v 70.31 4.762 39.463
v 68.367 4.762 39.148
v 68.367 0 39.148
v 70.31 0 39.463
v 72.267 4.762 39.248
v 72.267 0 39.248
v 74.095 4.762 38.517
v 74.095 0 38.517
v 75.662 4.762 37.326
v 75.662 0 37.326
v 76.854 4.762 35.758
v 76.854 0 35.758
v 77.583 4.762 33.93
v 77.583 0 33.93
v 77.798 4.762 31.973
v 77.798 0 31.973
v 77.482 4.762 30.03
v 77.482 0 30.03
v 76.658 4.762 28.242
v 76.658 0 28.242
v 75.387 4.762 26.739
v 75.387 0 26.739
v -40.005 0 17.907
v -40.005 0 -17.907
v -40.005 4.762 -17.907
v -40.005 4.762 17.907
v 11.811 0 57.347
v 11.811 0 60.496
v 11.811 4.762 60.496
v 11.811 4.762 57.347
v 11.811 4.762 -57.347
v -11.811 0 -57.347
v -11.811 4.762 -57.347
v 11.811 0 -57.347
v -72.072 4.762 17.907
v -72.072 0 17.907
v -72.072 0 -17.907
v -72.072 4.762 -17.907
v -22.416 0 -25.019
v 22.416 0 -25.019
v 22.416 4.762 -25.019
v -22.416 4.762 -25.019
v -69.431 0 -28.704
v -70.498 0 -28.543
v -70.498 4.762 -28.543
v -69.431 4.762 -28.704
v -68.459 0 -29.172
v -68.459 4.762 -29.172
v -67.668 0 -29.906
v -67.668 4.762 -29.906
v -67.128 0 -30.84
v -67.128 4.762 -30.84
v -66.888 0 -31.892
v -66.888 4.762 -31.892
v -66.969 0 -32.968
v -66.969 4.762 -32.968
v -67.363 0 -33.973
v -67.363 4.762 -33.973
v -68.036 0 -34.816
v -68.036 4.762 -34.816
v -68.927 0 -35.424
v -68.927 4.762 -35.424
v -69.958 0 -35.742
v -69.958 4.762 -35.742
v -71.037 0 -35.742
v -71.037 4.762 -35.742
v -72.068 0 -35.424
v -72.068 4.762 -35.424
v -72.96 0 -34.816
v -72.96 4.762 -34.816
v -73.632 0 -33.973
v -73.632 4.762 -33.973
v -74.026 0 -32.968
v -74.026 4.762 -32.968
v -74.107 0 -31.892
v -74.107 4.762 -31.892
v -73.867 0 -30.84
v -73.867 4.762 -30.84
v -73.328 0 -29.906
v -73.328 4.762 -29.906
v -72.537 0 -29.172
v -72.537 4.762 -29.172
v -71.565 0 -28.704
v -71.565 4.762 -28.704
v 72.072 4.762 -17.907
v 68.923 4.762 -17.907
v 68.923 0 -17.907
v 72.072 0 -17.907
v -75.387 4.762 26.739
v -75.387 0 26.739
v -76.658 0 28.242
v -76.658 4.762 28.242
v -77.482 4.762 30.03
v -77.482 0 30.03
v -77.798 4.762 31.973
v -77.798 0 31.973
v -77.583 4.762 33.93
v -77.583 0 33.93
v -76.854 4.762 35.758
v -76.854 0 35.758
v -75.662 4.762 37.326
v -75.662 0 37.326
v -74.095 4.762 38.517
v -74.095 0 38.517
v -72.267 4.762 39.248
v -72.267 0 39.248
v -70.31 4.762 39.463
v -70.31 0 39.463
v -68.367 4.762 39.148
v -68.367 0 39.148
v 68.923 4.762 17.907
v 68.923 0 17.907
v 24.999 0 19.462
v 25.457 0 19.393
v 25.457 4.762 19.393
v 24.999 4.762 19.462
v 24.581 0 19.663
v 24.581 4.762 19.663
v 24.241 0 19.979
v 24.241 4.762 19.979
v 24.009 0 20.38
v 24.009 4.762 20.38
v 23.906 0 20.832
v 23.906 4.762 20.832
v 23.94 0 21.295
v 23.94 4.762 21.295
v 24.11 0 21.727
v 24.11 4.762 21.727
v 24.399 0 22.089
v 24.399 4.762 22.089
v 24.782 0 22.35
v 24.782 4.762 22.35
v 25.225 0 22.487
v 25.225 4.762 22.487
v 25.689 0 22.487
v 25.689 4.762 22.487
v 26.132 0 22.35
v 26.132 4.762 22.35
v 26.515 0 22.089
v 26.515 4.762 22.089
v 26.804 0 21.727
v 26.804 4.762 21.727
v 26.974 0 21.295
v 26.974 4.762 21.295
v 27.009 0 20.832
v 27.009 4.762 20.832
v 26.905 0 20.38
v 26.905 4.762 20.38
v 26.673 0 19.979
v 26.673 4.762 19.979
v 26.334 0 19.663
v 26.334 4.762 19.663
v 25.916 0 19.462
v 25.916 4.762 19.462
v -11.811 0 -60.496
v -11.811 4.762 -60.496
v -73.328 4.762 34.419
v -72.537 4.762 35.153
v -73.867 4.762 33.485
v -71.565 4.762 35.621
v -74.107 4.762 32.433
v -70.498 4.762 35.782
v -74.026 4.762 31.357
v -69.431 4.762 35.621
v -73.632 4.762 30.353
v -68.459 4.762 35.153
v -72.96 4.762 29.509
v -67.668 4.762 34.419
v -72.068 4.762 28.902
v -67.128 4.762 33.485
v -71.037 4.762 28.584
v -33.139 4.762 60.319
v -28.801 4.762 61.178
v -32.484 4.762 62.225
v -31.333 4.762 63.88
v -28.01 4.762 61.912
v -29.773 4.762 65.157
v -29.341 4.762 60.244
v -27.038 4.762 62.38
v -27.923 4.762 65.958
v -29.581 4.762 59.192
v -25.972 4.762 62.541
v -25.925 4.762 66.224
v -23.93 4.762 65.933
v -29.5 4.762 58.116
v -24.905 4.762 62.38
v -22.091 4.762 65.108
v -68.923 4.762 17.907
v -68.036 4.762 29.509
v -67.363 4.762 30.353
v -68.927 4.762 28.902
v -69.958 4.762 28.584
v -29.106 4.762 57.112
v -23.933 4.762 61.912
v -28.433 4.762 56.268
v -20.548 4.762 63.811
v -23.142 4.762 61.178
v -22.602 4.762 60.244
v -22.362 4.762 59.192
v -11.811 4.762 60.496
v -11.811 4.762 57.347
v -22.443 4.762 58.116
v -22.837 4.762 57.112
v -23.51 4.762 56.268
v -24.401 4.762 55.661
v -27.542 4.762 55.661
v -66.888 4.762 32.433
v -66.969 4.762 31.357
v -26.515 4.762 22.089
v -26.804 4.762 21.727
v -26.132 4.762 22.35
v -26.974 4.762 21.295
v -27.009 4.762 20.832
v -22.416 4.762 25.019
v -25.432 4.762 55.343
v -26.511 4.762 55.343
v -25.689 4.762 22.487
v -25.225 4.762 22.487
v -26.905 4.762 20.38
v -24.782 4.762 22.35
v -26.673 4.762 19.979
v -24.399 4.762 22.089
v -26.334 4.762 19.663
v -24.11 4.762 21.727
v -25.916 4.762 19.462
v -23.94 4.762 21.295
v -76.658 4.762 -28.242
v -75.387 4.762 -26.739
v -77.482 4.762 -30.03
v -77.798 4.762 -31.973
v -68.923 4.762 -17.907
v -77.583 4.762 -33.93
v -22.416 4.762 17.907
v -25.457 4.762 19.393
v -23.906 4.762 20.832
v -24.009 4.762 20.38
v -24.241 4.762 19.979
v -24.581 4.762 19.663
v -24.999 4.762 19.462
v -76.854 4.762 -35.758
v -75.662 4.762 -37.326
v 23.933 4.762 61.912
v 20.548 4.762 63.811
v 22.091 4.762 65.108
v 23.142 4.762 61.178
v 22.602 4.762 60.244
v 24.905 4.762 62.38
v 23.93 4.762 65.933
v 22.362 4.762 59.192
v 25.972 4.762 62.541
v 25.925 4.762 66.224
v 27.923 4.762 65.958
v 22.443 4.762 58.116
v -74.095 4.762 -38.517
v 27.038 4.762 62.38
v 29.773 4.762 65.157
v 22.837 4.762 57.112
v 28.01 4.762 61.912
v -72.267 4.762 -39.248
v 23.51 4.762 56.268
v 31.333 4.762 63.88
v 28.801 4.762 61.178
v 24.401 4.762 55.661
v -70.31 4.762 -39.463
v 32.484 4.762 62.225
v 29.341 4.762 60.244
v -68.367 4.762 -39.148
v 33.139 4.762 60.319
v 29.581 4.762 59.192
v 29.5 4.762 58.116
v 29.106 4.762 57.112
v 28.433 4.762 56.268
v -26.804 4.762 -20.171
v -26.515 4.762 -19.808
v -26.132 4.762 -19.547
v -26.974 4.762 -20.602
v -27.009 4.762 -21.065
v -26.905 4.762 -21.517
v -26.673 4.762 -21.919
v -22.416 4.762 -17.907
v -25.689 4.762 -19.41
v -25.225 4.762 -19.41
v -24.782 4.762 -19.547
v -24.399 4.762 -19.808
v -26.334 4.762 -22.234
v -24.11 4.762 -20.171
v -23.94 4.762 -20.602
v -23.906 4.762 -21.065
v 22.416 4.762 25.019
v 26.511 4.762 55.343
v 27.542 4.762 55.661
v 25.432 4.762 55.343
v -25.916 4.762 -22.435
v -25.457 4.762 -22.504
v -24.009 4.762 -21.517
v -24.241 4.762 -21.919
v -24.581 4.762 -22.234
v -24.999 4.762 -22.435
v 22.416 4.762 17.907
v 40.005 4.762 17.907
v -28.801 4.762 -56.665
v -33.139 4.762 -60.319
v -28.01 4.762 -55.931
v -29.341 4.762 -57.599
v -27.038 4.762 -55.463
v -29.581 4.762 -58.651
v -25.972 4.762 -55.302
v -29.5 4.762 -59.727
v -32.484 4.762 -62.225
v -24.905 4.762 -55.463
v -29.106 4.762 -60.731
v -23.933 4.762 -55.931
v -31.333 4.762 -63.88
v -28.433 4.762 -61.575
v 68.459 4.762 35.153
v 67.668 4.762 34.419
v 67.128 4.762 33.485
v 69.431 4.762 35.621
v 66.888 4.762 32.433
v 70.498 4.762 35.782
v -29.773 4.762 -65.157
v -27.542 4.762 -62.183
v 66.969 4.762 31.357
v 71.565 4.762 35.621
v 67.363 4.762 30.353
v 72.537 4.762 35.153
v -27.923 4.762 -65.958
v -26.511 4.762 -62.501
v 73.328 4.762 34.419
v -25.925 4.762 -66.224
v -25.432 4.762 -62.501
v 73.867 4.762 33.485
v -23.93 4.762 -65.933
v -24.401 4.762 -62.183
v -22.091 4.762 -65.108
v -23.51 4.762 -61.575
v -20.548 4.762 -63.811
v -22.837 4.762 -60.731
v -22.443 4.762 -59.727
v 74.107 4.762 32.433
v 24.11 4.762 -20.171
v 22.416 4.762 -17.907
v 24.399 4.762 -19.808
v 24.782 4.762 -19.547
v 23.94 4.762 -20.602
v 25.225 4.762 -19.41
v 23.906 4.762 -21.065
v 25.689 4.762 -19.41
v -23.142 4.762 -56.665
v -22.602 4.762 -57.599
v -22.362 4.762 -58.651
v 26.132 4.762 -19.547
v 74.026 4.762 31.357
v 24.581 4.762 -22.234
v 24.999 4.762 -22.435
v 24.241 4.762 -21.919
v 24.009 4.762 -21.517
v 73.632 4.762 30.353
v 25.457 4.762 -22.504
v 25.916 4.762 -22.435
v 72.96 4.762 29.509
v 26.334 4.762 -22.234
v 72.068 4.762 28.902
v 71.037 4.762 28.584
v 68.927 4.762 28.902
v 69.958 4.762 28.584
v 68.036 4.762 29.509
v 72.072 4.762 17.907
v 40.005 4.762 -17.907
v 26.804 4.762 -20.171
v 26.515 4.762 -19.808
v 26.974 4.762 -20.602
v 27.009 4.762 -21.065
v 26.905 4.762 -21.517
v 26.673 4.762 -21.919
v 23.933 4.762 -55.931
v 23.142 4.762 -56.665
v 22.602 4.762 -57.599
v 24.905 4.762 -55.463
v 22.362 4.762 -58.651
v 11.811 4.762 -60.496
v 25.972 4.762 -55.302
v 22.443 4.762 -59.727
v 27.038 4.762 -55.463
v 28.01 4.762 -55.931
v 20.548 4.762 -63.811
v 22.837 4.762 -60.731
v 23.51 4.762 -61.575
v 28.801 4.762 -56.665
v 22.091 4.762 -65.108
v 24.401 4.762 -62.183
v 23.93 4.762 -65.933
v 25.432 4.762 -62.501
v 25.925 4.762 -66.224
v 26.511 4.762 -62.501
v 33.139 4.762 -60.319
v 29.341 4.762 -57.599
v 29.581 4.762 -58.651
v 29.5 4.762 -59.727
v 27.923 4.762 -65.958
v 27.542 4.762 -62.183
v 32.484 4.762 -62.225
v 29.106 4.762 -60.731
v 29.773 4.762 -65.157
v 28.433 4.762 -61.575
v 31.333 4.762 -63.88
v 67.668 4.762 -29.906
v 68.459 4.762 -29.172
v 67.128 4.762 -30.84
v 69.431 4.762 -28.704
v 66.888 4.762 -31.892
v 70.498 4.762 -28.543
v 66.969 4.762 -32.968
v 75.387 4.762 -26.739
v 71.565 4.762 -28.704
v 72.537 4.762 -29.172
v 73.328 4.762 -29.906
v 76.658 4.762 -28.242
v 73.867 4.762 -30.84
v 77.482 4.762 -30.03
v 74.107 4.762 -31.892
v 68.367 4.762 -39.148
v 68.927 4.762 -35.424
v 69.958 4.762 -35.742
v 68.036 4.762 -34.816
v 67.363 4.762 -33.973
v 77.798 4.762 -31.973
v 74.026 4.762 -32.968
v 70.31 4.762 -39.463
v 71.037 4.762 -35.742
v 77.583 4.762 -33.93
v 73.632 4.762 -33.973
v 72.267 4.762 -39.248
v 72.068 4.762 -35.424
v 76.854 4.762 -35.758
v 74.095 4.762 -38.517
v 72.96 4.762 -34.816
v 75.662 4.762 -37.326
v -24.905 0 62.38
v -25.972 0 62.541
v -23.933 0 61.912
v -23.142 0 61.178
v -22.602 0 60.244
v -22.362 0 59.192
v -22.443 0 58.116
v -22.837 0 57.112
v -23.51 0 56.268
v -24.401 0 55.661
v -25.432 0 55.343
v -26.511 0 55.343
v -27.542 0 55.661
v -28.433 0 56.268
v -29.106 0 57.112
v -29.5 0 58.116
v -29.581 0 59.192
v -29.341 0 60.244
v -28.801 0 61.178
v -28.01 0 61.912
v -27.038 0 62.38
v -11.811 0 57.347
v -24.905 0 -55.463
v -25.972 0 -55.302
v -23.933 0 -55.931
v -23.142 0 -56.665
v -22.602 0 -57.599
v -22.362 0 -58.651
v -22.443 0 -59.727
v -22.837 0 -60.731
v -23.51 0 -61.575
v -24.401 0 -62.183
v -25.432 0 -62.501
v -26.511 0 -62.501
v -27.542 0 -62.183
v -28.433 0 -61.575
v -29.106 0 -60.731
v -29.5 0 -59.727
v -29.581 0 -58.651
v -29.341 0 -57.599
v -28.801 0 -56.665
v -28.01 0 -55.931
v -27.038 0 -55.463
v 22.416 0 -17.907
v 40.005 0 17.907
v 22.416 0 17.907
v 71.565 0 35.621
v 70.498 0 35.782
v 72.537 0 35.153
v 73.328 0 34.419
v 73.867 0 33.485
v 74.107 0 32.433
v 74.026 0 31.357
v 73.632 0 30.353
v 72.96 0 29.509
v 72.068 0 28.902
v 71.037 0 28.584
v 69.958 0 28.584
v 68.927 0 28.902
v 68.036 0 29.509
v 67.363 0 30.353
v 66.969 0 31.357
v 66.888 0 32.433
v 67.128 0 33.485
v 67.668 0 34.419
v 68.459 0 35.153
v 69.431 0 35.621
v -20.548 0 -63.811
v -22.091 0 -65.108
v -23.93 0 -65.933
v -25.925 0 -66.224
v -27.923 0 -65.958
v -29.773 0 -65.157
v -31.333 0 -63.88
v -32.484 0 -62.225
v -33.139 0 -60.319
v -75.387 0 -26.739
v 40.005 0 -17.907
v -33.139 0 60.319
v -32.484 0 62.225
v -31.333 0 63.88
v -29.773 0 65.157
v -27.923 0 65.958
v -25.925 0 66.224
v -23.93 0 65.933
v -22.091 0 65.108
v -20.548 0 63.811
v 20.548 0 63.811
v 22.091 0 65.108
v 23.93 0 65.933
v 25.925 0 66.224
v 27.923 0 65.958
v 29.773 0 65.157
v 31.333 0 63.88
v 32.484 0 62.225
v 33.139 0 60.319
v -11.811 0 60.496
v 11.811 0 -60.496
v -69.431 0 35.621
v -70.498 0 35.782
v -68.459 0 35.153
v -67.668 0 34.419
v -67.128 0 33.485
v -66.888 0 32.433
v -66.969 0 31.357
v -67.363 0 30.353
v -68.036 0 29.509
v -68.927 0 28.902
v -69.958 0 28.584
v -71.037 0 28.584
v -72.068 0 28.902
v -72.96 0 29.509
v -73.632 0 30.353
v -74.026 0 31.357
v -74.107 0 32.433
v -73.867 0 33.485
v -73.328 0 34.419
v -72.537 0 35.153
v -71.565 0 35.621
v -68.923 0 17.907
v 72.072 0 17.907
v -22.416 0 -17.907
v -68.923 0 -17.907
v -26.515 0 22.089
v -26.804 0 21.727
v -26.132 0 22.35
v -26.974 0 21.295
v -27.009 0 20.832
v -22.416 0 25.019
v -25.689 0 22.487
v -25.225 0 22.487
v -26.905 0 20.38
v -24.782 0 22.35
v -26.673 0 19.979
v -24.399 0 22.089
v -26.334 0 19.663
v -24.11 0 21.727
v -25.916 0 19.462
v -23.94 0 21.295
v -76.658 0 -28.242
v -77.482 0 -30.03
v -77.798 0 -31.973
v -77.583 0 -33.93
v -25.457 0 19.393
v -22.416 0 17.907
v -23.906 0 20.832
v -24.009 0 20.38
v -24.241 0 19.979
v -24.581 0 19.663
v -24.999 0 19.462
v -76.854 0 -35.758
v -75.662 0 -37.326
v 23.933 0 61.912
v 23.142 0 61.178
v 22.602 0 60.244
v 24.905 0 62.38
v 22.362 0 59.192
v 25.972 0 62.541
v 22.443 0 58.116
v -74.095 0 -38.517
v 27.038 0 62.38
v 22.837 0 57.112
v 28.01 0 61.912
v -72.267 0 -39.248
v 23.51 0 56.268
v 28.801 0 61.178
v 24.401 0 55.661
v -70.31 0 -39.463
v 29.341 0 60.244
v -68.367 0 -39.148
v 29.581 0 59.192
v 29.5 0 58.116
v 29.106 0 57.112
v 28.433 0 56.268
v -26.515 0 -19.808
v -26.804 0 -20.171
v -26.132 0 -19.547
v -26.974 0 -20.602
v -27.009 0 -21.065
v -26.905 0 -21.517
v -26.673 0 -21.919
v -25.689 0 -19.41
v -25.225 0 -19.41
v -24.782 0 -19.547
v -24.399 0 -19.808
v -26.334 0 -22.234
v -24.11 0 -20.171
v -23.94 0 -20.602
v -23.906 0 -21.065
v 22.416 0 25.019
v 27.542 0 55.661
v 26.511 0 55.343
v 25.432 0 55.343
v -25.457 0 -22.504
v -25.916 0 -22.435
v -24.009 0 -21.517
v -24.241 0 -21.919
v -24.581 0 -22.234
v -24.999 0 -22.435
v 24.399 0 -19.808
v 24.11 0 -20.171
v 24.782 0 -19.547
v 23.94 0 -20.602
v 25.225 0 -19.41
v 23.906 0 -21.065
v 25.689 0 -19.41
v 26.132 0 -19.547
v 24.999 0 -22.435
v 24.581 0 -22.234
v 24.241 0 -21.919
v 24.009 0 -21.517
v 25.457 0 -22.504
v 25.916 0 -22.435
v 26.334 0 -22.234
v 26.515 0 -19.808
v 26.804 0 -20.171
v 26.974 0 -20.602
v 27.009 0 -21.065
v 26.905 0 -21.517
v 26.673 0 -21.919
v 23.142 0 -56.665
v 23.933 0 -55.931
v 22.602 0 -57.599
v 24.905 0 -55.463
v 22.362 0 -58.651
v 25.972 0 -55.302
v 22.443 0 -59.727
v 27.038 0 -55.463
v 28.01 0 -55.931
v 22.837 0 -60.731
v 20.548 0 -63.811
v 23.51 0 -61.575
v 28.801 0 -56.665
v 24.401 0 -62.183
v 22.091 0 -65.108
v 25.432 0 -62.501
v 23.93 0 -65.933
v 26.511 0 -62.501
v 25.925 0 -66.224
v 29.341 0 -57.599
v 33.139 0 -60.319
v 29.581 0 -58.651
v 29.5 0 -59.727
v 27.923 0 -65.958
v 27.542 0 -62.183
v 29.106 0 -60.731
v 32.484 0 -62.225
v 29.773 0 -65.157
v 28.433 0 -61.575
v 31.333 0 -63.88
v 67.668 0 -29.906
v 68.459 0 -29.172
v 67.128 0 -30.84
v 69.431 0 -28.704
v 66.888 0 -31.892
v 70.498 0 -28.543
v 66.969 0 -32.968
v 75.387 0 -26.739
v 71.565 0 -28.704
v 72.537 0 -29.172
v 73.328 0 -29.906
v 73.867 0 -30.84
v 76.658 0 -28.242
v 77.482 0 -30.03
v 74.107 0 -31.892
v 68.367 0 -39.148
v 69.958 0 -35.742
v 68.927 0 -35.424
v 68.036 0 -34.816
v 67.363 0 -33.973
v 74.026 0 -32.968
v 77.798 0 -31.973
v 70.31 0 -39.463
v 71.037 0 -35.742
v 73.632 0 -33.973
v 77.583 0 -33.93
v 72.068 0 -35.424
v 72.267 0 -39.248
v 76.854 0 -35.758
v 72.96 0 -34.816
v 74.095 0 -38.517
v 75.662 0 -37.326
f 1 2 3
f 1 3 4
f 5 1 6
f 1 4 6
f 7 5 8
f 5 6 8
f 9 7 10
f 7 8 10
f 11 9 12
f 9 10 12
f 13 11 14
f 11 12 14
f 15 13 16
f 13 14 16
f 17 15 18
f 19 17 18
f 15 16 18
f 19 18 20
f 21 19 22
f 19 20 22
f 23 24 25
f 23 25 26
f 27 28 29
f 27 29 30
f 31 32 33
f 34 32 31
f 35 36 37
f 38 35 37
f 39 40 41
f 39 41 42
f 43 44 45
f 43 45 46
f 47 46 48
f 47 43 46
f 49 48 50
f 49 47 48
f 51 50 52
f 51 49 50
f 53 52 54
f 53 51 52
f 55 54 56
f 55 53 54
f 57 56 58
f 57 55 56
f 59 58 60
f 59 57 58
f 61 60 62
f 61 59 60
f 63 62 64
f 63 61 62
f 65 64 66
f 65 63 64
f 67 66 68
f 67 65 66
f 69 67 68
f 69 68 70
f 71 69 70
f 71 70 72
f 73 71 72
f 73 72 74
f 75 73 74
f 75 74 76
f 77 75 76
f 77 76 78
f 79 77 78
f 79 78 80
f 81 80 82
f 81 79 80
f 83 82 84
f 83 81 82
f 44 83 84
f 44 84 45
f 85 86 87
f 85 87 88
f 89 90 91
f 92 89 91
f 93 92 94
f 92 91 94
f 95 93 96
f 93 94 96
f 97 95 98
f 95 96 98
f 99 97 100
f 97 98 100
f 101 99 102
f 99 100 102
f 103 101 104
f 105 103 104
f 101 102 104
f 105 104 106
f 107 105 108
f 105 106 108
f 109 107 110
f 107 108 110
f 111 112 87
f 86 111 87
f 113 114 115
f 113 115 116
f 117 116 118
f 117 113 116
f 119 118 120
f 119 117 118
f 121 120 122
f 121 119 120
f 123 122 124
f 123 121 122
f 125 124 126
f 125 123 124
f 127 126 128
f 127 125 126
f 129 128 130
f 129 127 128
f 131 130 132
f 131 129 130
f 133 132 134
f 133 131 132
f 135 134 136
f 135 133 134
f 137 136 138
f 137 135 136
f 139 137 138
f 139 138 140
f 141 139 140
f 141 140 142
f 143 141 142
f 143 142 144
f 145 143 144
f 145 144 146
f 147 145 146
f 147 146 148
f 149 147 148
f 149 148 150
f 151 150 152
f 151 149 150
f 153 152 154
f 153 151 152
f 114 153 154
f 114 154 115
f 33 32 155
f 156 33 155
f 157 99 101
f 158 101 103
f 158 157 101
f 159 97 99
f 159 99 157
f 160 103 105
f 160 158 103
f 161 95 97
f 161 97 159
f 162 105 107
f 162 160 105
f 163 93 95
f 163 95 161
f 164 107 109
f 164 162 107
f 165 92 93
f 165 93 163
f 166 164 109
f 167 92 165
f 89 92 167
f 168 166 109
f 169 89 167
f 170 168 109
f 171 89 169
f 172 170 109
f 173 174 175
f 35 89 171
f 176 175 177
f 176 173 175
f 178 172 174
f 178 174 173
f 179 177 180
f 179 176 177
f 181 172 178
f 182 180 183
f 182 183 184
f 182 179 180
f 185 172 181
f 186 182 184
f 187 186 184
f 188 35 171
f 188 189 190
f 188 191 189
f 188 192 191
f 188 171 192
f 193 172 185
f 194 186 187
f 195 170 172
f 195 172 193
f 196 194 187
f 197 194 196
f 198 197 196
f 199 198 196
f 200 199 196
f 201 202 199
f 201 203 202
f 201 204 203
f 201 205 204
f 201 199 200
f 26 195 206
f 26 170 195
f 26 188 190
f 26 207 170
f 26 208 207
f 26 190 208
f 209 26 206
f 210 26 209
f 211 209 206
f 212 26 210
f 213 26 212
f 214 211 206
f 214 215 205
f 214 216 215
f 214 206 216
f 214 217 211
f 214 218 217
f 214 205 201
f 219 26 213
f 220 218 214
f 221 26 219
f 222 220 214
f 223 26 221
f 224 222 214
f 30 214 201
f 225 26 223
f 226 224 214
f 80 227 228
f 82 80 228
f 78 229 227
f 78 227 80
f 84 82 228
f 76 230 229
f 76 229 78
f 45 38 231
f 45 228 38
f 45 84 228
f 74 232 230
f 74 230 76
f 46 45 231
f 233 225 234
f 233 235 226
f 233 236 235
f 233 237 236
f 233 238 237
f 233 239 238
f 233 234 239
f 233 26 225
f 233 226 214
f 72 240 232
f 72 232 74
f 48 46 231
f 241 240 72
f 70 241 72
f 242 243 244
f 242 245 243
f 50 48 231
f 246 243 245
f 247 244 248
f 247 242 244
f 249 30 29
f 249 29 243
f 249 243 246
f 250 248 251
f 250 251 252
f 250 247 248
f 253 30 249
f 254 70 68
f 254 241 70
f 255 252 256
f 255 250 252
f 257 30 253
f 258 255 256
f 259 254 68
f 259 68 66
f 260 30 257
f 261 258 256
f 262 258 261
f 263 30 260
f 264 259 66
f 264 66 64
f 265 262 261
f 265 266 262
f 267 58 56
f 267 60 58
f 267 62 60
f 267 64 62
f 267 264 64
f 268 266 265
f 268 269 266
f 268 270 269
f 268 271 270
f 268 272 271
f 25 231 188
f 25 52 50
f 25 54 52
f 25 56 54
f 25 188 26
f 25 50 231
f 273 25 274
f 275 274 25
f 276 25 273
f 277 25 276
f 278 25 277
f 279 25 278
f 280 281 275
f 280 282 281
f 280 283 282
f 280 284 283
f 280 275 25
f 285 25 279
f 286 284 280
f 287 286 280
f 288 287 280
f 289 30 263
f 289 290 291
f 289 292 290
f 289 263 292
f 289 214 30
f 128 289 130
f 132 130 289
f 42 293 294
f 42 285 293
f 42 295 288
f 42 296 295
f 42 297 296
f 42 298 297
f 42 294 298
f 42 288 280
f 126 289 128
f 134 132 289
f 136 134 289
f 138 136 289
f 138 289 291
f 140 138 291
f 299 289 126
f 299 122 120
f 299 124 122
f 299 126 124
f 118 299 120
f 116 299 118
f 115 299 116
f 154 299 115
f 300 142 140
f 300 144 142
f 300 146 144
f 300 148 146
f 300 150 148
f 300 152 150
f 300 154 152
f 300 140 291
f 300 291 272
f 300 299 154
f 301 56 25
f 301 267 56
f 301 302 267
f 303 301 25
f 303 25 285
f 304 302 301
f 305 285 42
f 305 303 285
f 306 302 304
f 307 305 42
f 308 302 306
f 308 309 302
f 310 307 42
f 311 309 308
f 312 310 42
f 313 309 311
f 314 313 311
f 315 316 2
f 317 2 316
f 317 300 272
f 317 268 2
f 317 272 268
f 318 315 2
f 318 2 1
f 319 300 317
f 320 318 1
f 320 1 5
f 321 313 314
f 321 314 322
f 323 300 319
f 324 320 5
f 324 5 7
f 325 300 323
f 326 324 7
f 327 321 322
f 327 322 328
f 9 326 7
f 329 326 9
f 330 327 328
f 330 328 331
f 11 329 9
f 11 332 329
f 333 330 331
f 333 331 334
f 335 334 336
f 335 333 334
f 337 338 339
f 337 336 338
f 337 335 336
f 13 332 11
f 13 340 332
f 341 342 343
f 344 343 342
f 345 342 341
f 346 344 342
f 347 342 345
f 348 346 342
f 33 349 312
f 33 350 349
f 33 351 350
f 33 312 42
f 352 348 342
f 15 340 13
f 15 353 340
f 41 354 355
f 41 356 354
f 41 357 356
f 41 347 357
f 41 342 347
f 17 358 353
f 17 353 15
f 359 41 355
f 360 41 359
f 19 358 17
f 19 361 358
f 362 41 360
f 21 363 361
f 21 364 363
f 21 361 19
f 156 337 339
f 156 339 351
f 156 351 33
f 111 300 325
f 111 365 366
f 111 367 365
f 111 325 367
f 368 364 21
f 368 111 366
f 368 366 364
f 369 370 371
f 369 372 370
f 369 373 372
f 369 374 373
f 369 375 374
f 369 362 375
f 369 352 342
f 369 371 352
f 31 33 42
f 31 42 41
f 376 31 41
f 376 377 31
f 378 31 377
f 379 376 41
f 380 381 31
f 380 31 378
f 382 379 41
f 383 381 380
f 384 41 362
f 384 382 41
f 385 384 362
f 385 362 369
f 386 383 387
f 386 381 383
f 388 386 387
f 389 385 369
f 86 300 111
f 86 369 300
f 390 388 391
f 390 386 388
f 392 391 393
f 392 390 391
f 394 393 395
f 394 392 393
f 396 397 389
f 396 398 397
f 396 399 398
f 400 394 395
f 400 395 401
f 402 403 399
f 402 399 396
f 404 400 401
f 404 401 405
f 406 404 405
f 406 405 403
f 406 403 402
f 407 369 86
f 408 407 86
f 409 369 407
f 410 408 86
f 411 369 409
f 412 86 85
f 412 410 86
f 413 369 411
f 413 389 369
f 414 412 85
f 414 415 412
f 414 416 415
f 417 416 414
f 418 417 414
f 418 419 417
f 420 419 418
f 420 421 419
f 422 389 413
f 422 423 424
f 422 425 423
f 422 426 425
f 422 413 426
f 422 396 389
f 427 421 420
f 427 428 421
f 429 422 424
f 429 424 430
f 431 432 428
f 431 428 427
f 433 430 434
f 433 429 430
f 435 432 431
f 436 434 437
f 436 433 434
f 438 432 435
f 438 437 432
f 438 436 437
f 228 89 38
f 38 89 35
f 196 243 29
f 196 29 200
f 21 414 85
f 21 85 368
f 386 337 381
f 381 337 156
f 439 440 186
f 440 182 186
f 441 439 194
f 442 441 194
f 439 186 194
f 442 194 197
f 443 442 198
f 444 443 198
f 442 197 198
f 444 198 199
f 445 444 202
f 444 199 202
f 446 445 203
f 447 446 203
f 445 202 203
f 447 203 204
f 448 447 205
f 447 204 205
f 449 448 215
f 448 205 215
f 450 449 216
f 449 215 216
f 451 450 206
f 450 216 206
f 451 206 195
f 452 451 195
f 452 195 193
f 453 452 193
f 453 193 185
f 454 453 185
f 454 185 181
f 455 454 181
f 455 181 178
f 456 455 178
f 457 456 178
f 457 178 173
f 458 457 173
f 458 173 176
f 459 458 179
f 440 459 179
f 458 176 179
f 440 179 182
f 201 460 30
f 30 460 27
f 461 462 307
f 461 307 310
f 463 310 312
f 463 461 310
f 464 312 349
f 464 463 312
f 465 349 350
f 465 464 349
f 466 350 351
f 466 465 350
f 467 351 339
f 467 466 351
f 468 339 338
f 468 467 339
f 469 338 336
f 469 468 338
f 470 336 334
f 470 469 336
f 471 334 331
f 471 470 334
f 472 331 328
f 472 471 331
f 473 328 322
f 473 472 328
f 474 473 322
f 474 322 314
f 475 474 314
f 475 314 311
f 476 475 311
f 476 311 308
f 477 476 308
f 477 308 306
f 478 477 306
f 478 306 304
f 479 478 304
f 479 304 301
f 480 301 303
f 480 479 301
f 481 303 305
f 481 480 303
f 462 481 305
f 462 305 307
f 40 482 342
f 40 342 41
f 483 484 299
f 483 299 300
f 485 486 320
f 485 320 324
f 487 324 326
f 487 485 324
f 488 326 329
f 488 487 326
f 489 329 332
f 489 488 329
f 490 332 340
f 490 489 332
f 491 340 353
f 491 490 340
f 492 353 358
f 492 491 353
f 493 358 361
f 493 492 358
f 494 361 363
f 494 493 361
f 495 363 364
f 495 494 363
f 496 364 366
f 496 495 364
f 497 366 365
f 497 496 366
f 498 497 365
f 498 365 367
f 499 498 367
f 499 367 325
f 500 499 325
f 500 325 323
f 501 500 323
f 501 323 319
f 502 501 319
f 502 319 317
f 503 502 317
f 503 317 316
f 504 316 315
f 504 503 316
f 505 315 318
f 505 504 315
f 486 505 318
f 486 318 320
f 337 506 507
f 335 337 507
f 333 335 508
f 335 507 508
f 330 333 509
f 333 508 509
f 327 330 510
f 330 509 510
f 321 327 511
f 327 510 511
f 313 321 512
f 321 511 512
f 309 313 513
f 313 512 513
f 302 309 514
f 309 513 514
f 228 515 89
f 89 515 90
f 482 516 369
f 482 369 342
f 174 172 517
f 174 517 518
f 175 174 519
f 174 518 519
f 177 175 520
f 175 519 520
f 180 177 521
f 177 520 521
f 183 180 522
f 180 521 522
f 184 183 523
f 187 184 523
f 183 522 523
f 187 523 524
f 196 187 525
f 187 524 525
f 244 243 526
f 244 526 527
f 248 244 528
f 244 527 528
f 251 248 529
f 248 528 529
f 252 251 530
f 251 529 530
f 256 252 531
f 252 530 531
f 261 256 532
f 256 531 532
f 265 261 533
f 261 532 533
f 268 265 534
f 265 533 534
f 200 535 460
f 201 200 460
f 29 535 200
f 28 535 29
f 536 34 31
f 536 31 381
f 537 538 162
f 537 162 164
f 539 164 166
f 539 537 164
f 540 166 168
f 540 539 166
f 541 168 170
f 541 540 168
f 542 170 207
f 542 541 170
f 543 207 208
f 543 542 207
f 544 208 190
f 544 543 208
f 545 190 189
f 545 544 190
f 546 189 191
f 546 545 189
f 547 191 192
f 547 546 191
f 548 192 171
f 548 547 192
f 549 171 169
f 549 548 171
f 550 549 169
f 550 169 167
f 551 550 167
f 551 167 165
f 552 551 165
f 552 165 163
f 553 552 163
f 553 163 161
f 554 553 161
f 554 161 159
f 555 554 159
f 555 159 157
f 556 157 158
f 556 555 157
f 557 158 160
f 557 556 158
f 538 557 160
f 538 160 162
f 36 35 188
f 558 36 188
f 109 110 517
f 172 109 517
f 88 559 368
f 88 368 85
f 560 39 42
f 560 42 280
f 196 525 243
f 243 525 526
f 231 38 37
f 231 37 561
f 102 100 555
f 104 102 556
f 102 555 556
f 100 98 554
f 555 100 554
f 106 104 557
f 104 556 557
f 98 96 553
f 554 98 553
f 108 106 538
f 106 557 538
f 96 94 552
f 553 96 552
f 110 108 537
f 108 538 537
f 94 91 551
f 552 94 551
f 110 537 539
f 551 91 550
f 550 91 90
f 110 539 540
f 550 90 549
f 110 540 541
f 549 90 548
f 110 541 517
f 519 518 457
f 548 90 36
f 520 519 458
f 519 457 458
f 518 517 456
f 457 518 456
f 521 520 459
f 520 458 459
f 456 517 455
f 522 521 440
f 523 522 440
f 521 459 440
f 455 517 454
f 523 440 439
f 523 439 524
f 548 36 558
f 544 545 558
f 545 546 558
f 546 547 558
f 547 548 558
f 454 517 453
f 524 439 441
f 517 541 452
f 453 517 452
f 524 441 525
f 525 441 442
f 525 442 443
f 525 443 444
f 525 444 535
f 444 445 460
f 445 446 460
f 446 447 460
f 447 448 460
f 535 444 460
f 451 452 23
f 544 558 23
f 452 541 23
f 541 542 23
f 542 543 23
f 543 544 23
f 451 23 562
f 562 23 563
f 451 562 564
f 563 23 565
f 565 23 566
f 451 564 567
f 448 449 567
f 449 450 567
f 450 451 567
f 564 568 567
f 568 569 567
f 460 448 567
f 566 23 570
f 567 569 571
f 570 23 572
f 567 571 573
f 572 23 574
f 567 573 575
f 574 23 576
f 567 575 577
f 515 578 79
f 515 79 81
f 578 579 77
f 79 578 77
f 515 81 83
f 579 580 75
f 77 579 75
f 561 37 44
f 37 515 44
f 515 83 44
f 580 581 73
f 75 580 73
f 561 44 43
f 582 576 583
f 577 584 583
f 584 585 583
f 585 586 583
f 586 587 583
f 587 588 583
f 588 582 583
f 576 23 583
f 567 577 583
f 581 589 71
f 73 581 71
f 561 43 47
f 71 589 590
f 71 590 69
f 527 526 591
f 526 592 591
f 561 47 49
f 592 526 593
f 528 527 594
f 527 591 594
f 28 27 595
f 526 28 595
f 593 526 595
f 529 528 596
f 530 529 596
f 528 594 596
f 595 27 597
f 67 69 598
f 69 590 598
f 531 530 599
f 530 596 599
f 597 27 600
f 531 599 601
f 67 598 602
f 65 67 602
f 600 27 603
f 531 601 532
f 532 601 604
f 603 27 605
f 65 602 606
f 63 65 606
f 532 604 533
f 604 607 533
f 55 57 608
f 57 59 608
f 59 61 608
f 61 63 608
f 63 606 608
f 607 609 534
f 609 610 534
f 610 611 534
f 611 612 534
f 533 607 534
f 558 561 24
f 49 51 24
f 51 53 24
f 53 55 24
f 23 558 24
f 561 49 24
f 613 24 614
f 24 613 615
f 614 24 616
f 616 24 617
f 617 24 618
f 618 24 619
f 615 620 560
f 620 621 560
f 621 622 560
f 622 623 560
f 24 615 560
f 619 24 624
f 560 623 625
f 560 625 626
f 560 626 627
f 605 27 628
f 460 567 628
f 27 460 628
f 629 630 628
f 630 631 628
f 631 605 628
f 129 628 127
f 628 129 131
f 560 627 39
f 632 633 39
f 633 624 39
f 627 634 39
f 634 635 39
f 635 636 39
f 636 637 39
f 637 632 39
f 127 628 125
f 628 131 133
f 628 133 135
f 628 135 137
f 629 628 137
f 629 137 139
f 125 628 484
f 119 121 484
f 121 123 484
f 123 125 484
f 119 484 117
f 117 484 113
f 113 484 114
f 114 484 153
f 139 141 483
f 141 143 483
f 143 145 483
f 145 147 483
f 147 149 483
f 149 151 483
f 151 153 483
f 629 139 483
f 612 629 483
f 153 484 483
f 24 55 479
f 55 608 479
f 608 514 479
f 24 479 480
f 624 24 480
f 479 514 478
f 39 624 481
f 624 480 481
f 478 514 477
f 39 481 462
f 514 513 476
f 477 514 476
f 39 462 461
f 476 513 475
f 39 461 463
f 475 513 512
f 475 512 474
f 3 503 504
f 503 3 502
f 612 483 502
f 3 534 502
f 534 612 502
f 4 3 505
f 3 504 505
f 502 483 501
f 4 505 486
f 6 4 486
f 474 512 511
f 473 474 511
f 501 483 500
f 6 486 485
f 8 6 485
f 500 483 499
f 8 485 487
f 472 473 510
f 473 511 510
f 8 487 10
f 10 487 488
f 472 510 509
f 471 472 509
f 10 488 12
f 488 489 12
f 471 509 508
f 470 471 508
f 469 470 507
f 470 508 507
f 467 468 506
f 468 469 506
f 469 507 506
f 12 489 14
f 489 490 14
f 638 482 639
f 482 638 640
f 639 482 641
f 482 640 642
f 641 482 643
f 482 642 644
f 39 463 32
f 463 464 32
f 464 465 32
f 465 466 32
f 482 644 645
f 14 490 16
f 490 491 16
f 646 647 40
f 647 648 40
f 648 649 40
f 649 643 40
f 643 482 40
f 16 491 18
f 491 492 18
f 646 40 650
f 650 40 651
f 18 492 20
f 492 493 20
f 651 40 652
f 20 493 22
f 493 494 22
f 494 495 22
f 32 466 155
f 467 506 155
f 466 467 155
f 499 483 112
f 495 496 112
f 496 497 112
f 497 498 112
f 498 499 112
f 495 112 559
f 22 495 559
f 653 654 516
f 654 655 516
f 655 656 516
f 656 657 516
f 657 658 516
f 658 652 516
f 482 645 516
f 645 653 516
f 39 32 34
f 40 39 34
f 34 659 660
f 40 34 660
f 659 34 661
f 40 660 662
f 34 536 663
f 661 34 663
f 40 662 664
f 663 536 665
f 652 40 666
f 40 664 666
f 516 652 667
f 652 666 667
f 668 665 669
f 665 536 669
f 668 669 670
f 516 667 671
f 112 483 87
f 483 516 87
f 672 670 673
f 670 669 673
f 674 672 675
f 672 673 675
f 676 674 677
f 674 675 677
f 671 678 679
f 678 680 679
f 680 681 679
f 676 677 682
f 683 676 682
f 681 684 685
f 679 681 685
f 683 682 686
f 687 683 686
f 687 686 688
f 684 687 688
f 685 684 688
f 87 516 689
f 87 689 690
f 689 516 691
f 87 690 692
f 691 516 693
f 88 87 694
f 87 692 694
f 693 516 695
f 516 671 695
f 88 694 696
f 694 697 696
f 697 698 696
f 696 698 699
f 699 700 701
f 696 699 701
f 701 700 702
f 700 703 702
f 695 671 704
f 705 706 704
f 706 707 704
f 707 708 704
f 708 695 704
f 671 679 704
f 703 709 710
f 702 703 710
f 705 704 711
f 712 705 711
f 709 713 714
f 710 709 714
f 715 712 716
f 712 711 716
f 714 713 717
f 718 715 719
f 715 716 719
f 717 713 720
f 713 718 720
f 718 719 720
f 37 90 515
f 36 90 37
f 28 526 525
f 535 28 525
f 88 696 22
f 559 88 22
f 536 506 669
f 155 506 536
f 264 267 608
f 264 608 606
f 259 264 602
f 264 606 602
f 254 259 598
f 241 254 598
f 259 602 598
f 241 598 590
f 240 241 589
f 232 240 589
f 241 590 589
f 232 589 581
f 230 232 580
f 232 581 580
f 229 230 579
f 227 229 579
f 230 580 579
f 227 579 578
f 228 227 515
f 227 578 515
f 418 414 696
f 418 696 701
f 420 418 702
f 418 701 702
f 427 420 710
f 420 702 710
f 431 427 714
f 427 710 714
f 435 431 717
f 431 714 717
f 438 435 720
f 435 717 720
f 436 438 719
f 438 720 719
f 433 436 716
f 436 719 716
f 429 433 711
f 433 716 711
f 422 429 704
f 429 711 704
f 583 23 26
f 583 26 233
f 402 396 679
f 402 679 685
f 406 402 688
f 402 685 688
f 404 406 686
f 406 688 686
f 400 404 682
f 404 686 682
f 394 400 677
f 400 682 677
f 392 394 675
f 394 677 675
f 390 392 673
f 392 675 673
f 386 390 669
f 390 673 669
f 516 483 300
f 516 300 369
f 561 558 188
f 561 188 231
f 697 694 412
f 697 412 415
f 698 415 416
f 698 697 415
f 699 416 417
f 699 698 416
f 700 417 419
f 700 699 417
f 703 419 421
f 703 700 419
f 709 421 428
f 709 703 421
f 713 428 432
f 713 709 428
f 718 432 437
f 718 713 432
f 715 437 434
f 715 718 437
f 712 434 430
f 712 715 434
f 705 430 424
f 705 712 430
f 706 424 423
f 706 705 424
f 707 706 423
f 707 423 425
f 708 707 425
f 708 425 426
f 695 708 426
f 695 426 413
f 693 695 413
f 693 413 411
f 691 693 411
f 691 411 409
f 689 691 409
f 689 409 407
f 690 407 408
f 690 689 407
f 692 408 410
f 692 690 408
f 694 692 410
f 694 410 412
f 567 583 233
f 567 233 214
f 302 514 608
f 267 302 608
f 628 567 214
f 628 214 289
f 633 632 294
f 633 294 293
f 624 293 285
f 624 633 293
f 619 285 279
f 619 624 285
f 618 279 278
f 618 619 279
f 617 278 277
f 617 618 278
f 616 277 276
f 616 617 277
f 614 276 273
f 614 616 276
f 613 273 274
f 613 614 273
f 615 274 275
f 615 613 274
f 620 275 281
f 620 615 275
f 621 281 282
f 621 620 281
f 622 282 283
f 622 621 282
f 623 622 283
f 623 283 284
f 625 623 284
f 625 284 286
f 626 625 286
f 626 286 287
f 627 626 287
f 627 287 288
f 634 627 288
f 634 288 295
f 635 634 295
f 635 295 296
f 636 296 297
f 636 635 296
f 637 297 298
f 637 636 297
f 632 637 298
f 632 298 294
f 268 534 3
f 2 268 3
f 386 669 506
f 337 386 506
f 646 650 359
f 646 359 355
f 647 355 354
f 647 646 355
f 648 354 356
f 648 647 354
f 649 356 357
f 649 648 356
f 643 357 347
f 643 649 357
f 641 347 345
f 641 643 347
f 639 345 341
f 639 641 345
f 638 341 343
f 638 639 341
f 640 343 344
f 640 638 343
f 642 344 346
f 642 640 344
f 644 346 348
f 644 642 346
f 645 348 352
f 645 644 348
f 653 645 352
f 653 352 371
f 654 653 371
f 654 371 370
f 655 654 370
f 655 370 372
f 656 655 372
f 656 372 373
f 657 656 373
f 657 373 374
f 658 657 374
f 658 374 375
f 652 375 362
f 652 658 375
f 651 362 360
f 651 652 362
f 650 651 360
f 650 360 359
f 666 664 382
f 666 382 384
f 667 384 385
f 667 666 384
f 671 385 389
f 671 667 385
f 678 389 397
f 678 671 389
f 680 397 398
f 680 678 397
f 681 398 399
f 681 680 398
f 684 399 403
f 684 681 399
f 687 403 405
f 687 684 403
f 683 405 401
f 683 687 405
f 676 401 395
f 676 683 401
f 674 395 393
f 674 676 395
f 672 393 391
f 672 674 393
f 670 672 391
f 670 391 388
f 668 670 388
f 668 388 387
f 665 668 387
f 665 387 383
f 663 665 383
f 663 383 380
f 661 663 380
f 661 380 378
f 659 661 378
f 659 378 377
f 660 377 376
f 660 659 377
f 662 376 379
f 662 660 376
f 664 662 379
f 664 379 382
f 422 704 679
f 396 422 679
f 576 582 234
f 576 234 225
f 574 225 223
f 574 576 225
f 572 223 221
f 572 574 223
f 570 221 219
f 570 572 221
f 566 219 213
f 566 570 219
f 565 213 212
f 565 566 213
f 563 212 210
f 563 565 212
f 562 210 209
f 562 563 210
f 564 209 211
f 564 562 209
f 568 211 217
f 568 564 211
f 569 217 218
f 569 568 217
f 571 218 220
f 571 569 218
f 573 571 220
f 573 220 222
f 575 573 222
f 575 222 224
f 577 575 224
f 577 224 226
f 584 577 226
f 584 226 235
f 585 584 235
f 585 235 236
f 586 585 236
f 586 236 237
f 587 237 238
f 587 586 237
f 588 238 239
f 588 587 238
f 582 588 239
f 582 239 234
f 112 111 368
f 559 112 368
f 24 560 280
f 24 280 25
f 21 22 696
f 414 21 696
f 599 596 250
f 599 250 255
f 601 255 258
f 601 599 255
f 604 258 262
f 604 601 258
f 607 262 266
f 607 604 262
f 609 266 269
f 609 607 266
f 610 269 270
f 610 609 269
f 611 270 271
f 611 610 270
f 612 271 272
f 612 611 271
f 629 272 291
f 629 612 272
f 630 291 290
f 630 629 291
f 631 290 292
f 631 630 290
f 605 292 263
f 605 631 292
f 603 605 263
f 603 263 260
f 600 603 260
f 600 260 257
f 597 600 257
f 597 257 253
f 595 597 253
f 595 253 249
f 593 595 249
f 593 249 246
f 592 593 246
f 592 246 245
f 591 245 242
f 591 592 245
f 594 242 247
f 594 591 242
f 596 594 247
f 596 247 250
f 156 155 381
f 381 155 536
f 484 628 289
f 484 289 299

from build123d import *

# Parameters (mm, degrees)
SKETCH1_W           = 23.622
SKETCH1_H           = 3.1496
SKETCH1_R           = 1.55575
SKETCH1_W_2         = 3.1496
SKETCH1_H_2         = 35.814
BOSS_EXTRUDE2_DEPTH = 4.7625
SKETCH1_4_R         = 3.6195
CUT_EXTRUDE1_DEPTH  = 4.7625


with BuildPart() as part:
    # Sketch1 → Boss-Extrude2 (new body)
    with BuildSketch(Plane(origin=(0, 0, 0), x_dir=(1, 0, 0), z_dir=(0, 1, 0))):
        with BuildLine():
            ThreePointArc((-68.367301266, 39.147584106), (-76.853616644, 35.758418209), (-75.3872, 26.738794248))
            Line((-75.3872, 26.738794248), (-75.3872, -26.738794248))
            ThreePointArc((-75.3872, -26.738794248), (-76.853616644, -35.758418209), (-68.367301266, -39.147584106))
            Line((-68.367301266, -39.147584106), (-33.139128227, -60.318651017))
            ThreePointArc((-33.139128227, -60.318651017), (-27.923290386, -65.958483133), (-20.547544248, -63.81115))
            Line((-20.547544248, -63.81115), (20.547544248, -63.81115))
            ThreePointArc((20.547544248, -63.81115), (27.923290386, -65.958483133), (33.139128227, -60.318651017))
            Line((33.139128227, -60.318651017), (68.367301266, -39.147584106))
            ThreePointArc((68.367301266, -39.147584106), (76.853616644, -35.758418209), (75.3872, -26.738794248))
            Line((75.3872, -26.738794248), (75.3872, 26.738794248))
            ThreePointArc((75.3872, 26.738794248), (76.853616644, 35.758418209), (68.367301266, 39.147584106))
            Line((68.367301266, 39.147584106), (33.139128227, 60.318651017))
            ThreePointArc((33.139128227, 60.318651017), (27.923290386, 65.958483133), (20.547544248, 63.81115))
            Line((20.547544248, 63.81115), (-20.547544248, 63.81115))
            ThreePointArc((-20.547544248, 63.81115), (-27.923290386, 65.958483133), (-33.139128227, 60.318651017))
            Line((-33.139128227, 60.318651017), (-68.367301266, 39.147584106))
        make_face()
        with Locations((0, 58.92165)):
            Rectangle(SKETCH1_W, SKETCH1_H, mode=Mode.SUBTRACT)
        with Locations((-25.45715, -20.94865)):
            Circle(SKETCH1_R, mode=Mode.SUBTRACT)
        with Locations((0, -58.92165)):
            Rectangle(SKETCH1_W, SKETCH1_H, mode=Mode.SUBTRACT)
        with Locations((25.45715, -20.94865)):
            Circle(SKETCH1_R, mode=Mode.SUBTRACT)
        with Locations((-70.4977, 0)):
            Rectangle(SKETCH1_W_2, SKETCH1_H_2, mode=Mode.SUBTRACT)
        with Locations((-25.45715, 20.94865)):
            Circle(SKETCH1_R, mode=Mode.SUBTRACT)
        Polygon((-40.005, -17.907), (-40.005, 17.907), (-22.4155, 17.907), (-22.4155, 25.019), (22.4155, 25.019), (22.4155, 17.907), (40.005, 17.907), (40.005, -17.907), (22.4155, -17.907), (22.4155, -25.019), (-22.4155, -25.019), (-22.4155, -17.907), align=None, mode=Mode.SUBTRACT)
        with Locations((25.45715, 20.94865)):
            Circle(SKETCH1_R, mode=Mode.SUBTRACT)
        with Locations((70.4977, 0)):
            Rectangle(SKETCH1_W_2, SKETCH1_H_2, mode=Mode.SUBTRACT)
    extrude(amount=BOSS_EXTRUDE2_DEPTH)

    # Sketch1<4> → Cut-Extrude1 (cut, symmetric)
    with BuildSketch(Plane(origin=(0, 0, 0), x_dir=(1, 0, 0), z_dir=(0, 1, 0))):
        with Locations((25.9715, -58.92165)):
            Circle(SKETCH1_4_R)
        with Locations((-70.4977, 32.16275)):
            Circle(SKETCH1_4_R)
        with Locations((-70.4977, -32.16275)):
            Circle(SKETCH1_4_R)
        with Locations((70.4977, 32.16275)):
            Circle(SKETCH1_4_R)
        with Locations((70.4977, -32.16275)):
            Circle(SKETCH1_4_R)
        with Locations((25.9715, 58.92165)):
            Circle(SKETCH1_4_R)
        with Locations((-25.9715, 58.92165)):
            Circle(SKETCH1_4_R)
        with Locations((-25.9715, -58.92165)):
            Circle(SKETCH1_4_R)
    extrude(amount=CUT_EXTRUDE1_DEPTH, both=True, mode=Mode.SUBTRACT)


solid = part.part
